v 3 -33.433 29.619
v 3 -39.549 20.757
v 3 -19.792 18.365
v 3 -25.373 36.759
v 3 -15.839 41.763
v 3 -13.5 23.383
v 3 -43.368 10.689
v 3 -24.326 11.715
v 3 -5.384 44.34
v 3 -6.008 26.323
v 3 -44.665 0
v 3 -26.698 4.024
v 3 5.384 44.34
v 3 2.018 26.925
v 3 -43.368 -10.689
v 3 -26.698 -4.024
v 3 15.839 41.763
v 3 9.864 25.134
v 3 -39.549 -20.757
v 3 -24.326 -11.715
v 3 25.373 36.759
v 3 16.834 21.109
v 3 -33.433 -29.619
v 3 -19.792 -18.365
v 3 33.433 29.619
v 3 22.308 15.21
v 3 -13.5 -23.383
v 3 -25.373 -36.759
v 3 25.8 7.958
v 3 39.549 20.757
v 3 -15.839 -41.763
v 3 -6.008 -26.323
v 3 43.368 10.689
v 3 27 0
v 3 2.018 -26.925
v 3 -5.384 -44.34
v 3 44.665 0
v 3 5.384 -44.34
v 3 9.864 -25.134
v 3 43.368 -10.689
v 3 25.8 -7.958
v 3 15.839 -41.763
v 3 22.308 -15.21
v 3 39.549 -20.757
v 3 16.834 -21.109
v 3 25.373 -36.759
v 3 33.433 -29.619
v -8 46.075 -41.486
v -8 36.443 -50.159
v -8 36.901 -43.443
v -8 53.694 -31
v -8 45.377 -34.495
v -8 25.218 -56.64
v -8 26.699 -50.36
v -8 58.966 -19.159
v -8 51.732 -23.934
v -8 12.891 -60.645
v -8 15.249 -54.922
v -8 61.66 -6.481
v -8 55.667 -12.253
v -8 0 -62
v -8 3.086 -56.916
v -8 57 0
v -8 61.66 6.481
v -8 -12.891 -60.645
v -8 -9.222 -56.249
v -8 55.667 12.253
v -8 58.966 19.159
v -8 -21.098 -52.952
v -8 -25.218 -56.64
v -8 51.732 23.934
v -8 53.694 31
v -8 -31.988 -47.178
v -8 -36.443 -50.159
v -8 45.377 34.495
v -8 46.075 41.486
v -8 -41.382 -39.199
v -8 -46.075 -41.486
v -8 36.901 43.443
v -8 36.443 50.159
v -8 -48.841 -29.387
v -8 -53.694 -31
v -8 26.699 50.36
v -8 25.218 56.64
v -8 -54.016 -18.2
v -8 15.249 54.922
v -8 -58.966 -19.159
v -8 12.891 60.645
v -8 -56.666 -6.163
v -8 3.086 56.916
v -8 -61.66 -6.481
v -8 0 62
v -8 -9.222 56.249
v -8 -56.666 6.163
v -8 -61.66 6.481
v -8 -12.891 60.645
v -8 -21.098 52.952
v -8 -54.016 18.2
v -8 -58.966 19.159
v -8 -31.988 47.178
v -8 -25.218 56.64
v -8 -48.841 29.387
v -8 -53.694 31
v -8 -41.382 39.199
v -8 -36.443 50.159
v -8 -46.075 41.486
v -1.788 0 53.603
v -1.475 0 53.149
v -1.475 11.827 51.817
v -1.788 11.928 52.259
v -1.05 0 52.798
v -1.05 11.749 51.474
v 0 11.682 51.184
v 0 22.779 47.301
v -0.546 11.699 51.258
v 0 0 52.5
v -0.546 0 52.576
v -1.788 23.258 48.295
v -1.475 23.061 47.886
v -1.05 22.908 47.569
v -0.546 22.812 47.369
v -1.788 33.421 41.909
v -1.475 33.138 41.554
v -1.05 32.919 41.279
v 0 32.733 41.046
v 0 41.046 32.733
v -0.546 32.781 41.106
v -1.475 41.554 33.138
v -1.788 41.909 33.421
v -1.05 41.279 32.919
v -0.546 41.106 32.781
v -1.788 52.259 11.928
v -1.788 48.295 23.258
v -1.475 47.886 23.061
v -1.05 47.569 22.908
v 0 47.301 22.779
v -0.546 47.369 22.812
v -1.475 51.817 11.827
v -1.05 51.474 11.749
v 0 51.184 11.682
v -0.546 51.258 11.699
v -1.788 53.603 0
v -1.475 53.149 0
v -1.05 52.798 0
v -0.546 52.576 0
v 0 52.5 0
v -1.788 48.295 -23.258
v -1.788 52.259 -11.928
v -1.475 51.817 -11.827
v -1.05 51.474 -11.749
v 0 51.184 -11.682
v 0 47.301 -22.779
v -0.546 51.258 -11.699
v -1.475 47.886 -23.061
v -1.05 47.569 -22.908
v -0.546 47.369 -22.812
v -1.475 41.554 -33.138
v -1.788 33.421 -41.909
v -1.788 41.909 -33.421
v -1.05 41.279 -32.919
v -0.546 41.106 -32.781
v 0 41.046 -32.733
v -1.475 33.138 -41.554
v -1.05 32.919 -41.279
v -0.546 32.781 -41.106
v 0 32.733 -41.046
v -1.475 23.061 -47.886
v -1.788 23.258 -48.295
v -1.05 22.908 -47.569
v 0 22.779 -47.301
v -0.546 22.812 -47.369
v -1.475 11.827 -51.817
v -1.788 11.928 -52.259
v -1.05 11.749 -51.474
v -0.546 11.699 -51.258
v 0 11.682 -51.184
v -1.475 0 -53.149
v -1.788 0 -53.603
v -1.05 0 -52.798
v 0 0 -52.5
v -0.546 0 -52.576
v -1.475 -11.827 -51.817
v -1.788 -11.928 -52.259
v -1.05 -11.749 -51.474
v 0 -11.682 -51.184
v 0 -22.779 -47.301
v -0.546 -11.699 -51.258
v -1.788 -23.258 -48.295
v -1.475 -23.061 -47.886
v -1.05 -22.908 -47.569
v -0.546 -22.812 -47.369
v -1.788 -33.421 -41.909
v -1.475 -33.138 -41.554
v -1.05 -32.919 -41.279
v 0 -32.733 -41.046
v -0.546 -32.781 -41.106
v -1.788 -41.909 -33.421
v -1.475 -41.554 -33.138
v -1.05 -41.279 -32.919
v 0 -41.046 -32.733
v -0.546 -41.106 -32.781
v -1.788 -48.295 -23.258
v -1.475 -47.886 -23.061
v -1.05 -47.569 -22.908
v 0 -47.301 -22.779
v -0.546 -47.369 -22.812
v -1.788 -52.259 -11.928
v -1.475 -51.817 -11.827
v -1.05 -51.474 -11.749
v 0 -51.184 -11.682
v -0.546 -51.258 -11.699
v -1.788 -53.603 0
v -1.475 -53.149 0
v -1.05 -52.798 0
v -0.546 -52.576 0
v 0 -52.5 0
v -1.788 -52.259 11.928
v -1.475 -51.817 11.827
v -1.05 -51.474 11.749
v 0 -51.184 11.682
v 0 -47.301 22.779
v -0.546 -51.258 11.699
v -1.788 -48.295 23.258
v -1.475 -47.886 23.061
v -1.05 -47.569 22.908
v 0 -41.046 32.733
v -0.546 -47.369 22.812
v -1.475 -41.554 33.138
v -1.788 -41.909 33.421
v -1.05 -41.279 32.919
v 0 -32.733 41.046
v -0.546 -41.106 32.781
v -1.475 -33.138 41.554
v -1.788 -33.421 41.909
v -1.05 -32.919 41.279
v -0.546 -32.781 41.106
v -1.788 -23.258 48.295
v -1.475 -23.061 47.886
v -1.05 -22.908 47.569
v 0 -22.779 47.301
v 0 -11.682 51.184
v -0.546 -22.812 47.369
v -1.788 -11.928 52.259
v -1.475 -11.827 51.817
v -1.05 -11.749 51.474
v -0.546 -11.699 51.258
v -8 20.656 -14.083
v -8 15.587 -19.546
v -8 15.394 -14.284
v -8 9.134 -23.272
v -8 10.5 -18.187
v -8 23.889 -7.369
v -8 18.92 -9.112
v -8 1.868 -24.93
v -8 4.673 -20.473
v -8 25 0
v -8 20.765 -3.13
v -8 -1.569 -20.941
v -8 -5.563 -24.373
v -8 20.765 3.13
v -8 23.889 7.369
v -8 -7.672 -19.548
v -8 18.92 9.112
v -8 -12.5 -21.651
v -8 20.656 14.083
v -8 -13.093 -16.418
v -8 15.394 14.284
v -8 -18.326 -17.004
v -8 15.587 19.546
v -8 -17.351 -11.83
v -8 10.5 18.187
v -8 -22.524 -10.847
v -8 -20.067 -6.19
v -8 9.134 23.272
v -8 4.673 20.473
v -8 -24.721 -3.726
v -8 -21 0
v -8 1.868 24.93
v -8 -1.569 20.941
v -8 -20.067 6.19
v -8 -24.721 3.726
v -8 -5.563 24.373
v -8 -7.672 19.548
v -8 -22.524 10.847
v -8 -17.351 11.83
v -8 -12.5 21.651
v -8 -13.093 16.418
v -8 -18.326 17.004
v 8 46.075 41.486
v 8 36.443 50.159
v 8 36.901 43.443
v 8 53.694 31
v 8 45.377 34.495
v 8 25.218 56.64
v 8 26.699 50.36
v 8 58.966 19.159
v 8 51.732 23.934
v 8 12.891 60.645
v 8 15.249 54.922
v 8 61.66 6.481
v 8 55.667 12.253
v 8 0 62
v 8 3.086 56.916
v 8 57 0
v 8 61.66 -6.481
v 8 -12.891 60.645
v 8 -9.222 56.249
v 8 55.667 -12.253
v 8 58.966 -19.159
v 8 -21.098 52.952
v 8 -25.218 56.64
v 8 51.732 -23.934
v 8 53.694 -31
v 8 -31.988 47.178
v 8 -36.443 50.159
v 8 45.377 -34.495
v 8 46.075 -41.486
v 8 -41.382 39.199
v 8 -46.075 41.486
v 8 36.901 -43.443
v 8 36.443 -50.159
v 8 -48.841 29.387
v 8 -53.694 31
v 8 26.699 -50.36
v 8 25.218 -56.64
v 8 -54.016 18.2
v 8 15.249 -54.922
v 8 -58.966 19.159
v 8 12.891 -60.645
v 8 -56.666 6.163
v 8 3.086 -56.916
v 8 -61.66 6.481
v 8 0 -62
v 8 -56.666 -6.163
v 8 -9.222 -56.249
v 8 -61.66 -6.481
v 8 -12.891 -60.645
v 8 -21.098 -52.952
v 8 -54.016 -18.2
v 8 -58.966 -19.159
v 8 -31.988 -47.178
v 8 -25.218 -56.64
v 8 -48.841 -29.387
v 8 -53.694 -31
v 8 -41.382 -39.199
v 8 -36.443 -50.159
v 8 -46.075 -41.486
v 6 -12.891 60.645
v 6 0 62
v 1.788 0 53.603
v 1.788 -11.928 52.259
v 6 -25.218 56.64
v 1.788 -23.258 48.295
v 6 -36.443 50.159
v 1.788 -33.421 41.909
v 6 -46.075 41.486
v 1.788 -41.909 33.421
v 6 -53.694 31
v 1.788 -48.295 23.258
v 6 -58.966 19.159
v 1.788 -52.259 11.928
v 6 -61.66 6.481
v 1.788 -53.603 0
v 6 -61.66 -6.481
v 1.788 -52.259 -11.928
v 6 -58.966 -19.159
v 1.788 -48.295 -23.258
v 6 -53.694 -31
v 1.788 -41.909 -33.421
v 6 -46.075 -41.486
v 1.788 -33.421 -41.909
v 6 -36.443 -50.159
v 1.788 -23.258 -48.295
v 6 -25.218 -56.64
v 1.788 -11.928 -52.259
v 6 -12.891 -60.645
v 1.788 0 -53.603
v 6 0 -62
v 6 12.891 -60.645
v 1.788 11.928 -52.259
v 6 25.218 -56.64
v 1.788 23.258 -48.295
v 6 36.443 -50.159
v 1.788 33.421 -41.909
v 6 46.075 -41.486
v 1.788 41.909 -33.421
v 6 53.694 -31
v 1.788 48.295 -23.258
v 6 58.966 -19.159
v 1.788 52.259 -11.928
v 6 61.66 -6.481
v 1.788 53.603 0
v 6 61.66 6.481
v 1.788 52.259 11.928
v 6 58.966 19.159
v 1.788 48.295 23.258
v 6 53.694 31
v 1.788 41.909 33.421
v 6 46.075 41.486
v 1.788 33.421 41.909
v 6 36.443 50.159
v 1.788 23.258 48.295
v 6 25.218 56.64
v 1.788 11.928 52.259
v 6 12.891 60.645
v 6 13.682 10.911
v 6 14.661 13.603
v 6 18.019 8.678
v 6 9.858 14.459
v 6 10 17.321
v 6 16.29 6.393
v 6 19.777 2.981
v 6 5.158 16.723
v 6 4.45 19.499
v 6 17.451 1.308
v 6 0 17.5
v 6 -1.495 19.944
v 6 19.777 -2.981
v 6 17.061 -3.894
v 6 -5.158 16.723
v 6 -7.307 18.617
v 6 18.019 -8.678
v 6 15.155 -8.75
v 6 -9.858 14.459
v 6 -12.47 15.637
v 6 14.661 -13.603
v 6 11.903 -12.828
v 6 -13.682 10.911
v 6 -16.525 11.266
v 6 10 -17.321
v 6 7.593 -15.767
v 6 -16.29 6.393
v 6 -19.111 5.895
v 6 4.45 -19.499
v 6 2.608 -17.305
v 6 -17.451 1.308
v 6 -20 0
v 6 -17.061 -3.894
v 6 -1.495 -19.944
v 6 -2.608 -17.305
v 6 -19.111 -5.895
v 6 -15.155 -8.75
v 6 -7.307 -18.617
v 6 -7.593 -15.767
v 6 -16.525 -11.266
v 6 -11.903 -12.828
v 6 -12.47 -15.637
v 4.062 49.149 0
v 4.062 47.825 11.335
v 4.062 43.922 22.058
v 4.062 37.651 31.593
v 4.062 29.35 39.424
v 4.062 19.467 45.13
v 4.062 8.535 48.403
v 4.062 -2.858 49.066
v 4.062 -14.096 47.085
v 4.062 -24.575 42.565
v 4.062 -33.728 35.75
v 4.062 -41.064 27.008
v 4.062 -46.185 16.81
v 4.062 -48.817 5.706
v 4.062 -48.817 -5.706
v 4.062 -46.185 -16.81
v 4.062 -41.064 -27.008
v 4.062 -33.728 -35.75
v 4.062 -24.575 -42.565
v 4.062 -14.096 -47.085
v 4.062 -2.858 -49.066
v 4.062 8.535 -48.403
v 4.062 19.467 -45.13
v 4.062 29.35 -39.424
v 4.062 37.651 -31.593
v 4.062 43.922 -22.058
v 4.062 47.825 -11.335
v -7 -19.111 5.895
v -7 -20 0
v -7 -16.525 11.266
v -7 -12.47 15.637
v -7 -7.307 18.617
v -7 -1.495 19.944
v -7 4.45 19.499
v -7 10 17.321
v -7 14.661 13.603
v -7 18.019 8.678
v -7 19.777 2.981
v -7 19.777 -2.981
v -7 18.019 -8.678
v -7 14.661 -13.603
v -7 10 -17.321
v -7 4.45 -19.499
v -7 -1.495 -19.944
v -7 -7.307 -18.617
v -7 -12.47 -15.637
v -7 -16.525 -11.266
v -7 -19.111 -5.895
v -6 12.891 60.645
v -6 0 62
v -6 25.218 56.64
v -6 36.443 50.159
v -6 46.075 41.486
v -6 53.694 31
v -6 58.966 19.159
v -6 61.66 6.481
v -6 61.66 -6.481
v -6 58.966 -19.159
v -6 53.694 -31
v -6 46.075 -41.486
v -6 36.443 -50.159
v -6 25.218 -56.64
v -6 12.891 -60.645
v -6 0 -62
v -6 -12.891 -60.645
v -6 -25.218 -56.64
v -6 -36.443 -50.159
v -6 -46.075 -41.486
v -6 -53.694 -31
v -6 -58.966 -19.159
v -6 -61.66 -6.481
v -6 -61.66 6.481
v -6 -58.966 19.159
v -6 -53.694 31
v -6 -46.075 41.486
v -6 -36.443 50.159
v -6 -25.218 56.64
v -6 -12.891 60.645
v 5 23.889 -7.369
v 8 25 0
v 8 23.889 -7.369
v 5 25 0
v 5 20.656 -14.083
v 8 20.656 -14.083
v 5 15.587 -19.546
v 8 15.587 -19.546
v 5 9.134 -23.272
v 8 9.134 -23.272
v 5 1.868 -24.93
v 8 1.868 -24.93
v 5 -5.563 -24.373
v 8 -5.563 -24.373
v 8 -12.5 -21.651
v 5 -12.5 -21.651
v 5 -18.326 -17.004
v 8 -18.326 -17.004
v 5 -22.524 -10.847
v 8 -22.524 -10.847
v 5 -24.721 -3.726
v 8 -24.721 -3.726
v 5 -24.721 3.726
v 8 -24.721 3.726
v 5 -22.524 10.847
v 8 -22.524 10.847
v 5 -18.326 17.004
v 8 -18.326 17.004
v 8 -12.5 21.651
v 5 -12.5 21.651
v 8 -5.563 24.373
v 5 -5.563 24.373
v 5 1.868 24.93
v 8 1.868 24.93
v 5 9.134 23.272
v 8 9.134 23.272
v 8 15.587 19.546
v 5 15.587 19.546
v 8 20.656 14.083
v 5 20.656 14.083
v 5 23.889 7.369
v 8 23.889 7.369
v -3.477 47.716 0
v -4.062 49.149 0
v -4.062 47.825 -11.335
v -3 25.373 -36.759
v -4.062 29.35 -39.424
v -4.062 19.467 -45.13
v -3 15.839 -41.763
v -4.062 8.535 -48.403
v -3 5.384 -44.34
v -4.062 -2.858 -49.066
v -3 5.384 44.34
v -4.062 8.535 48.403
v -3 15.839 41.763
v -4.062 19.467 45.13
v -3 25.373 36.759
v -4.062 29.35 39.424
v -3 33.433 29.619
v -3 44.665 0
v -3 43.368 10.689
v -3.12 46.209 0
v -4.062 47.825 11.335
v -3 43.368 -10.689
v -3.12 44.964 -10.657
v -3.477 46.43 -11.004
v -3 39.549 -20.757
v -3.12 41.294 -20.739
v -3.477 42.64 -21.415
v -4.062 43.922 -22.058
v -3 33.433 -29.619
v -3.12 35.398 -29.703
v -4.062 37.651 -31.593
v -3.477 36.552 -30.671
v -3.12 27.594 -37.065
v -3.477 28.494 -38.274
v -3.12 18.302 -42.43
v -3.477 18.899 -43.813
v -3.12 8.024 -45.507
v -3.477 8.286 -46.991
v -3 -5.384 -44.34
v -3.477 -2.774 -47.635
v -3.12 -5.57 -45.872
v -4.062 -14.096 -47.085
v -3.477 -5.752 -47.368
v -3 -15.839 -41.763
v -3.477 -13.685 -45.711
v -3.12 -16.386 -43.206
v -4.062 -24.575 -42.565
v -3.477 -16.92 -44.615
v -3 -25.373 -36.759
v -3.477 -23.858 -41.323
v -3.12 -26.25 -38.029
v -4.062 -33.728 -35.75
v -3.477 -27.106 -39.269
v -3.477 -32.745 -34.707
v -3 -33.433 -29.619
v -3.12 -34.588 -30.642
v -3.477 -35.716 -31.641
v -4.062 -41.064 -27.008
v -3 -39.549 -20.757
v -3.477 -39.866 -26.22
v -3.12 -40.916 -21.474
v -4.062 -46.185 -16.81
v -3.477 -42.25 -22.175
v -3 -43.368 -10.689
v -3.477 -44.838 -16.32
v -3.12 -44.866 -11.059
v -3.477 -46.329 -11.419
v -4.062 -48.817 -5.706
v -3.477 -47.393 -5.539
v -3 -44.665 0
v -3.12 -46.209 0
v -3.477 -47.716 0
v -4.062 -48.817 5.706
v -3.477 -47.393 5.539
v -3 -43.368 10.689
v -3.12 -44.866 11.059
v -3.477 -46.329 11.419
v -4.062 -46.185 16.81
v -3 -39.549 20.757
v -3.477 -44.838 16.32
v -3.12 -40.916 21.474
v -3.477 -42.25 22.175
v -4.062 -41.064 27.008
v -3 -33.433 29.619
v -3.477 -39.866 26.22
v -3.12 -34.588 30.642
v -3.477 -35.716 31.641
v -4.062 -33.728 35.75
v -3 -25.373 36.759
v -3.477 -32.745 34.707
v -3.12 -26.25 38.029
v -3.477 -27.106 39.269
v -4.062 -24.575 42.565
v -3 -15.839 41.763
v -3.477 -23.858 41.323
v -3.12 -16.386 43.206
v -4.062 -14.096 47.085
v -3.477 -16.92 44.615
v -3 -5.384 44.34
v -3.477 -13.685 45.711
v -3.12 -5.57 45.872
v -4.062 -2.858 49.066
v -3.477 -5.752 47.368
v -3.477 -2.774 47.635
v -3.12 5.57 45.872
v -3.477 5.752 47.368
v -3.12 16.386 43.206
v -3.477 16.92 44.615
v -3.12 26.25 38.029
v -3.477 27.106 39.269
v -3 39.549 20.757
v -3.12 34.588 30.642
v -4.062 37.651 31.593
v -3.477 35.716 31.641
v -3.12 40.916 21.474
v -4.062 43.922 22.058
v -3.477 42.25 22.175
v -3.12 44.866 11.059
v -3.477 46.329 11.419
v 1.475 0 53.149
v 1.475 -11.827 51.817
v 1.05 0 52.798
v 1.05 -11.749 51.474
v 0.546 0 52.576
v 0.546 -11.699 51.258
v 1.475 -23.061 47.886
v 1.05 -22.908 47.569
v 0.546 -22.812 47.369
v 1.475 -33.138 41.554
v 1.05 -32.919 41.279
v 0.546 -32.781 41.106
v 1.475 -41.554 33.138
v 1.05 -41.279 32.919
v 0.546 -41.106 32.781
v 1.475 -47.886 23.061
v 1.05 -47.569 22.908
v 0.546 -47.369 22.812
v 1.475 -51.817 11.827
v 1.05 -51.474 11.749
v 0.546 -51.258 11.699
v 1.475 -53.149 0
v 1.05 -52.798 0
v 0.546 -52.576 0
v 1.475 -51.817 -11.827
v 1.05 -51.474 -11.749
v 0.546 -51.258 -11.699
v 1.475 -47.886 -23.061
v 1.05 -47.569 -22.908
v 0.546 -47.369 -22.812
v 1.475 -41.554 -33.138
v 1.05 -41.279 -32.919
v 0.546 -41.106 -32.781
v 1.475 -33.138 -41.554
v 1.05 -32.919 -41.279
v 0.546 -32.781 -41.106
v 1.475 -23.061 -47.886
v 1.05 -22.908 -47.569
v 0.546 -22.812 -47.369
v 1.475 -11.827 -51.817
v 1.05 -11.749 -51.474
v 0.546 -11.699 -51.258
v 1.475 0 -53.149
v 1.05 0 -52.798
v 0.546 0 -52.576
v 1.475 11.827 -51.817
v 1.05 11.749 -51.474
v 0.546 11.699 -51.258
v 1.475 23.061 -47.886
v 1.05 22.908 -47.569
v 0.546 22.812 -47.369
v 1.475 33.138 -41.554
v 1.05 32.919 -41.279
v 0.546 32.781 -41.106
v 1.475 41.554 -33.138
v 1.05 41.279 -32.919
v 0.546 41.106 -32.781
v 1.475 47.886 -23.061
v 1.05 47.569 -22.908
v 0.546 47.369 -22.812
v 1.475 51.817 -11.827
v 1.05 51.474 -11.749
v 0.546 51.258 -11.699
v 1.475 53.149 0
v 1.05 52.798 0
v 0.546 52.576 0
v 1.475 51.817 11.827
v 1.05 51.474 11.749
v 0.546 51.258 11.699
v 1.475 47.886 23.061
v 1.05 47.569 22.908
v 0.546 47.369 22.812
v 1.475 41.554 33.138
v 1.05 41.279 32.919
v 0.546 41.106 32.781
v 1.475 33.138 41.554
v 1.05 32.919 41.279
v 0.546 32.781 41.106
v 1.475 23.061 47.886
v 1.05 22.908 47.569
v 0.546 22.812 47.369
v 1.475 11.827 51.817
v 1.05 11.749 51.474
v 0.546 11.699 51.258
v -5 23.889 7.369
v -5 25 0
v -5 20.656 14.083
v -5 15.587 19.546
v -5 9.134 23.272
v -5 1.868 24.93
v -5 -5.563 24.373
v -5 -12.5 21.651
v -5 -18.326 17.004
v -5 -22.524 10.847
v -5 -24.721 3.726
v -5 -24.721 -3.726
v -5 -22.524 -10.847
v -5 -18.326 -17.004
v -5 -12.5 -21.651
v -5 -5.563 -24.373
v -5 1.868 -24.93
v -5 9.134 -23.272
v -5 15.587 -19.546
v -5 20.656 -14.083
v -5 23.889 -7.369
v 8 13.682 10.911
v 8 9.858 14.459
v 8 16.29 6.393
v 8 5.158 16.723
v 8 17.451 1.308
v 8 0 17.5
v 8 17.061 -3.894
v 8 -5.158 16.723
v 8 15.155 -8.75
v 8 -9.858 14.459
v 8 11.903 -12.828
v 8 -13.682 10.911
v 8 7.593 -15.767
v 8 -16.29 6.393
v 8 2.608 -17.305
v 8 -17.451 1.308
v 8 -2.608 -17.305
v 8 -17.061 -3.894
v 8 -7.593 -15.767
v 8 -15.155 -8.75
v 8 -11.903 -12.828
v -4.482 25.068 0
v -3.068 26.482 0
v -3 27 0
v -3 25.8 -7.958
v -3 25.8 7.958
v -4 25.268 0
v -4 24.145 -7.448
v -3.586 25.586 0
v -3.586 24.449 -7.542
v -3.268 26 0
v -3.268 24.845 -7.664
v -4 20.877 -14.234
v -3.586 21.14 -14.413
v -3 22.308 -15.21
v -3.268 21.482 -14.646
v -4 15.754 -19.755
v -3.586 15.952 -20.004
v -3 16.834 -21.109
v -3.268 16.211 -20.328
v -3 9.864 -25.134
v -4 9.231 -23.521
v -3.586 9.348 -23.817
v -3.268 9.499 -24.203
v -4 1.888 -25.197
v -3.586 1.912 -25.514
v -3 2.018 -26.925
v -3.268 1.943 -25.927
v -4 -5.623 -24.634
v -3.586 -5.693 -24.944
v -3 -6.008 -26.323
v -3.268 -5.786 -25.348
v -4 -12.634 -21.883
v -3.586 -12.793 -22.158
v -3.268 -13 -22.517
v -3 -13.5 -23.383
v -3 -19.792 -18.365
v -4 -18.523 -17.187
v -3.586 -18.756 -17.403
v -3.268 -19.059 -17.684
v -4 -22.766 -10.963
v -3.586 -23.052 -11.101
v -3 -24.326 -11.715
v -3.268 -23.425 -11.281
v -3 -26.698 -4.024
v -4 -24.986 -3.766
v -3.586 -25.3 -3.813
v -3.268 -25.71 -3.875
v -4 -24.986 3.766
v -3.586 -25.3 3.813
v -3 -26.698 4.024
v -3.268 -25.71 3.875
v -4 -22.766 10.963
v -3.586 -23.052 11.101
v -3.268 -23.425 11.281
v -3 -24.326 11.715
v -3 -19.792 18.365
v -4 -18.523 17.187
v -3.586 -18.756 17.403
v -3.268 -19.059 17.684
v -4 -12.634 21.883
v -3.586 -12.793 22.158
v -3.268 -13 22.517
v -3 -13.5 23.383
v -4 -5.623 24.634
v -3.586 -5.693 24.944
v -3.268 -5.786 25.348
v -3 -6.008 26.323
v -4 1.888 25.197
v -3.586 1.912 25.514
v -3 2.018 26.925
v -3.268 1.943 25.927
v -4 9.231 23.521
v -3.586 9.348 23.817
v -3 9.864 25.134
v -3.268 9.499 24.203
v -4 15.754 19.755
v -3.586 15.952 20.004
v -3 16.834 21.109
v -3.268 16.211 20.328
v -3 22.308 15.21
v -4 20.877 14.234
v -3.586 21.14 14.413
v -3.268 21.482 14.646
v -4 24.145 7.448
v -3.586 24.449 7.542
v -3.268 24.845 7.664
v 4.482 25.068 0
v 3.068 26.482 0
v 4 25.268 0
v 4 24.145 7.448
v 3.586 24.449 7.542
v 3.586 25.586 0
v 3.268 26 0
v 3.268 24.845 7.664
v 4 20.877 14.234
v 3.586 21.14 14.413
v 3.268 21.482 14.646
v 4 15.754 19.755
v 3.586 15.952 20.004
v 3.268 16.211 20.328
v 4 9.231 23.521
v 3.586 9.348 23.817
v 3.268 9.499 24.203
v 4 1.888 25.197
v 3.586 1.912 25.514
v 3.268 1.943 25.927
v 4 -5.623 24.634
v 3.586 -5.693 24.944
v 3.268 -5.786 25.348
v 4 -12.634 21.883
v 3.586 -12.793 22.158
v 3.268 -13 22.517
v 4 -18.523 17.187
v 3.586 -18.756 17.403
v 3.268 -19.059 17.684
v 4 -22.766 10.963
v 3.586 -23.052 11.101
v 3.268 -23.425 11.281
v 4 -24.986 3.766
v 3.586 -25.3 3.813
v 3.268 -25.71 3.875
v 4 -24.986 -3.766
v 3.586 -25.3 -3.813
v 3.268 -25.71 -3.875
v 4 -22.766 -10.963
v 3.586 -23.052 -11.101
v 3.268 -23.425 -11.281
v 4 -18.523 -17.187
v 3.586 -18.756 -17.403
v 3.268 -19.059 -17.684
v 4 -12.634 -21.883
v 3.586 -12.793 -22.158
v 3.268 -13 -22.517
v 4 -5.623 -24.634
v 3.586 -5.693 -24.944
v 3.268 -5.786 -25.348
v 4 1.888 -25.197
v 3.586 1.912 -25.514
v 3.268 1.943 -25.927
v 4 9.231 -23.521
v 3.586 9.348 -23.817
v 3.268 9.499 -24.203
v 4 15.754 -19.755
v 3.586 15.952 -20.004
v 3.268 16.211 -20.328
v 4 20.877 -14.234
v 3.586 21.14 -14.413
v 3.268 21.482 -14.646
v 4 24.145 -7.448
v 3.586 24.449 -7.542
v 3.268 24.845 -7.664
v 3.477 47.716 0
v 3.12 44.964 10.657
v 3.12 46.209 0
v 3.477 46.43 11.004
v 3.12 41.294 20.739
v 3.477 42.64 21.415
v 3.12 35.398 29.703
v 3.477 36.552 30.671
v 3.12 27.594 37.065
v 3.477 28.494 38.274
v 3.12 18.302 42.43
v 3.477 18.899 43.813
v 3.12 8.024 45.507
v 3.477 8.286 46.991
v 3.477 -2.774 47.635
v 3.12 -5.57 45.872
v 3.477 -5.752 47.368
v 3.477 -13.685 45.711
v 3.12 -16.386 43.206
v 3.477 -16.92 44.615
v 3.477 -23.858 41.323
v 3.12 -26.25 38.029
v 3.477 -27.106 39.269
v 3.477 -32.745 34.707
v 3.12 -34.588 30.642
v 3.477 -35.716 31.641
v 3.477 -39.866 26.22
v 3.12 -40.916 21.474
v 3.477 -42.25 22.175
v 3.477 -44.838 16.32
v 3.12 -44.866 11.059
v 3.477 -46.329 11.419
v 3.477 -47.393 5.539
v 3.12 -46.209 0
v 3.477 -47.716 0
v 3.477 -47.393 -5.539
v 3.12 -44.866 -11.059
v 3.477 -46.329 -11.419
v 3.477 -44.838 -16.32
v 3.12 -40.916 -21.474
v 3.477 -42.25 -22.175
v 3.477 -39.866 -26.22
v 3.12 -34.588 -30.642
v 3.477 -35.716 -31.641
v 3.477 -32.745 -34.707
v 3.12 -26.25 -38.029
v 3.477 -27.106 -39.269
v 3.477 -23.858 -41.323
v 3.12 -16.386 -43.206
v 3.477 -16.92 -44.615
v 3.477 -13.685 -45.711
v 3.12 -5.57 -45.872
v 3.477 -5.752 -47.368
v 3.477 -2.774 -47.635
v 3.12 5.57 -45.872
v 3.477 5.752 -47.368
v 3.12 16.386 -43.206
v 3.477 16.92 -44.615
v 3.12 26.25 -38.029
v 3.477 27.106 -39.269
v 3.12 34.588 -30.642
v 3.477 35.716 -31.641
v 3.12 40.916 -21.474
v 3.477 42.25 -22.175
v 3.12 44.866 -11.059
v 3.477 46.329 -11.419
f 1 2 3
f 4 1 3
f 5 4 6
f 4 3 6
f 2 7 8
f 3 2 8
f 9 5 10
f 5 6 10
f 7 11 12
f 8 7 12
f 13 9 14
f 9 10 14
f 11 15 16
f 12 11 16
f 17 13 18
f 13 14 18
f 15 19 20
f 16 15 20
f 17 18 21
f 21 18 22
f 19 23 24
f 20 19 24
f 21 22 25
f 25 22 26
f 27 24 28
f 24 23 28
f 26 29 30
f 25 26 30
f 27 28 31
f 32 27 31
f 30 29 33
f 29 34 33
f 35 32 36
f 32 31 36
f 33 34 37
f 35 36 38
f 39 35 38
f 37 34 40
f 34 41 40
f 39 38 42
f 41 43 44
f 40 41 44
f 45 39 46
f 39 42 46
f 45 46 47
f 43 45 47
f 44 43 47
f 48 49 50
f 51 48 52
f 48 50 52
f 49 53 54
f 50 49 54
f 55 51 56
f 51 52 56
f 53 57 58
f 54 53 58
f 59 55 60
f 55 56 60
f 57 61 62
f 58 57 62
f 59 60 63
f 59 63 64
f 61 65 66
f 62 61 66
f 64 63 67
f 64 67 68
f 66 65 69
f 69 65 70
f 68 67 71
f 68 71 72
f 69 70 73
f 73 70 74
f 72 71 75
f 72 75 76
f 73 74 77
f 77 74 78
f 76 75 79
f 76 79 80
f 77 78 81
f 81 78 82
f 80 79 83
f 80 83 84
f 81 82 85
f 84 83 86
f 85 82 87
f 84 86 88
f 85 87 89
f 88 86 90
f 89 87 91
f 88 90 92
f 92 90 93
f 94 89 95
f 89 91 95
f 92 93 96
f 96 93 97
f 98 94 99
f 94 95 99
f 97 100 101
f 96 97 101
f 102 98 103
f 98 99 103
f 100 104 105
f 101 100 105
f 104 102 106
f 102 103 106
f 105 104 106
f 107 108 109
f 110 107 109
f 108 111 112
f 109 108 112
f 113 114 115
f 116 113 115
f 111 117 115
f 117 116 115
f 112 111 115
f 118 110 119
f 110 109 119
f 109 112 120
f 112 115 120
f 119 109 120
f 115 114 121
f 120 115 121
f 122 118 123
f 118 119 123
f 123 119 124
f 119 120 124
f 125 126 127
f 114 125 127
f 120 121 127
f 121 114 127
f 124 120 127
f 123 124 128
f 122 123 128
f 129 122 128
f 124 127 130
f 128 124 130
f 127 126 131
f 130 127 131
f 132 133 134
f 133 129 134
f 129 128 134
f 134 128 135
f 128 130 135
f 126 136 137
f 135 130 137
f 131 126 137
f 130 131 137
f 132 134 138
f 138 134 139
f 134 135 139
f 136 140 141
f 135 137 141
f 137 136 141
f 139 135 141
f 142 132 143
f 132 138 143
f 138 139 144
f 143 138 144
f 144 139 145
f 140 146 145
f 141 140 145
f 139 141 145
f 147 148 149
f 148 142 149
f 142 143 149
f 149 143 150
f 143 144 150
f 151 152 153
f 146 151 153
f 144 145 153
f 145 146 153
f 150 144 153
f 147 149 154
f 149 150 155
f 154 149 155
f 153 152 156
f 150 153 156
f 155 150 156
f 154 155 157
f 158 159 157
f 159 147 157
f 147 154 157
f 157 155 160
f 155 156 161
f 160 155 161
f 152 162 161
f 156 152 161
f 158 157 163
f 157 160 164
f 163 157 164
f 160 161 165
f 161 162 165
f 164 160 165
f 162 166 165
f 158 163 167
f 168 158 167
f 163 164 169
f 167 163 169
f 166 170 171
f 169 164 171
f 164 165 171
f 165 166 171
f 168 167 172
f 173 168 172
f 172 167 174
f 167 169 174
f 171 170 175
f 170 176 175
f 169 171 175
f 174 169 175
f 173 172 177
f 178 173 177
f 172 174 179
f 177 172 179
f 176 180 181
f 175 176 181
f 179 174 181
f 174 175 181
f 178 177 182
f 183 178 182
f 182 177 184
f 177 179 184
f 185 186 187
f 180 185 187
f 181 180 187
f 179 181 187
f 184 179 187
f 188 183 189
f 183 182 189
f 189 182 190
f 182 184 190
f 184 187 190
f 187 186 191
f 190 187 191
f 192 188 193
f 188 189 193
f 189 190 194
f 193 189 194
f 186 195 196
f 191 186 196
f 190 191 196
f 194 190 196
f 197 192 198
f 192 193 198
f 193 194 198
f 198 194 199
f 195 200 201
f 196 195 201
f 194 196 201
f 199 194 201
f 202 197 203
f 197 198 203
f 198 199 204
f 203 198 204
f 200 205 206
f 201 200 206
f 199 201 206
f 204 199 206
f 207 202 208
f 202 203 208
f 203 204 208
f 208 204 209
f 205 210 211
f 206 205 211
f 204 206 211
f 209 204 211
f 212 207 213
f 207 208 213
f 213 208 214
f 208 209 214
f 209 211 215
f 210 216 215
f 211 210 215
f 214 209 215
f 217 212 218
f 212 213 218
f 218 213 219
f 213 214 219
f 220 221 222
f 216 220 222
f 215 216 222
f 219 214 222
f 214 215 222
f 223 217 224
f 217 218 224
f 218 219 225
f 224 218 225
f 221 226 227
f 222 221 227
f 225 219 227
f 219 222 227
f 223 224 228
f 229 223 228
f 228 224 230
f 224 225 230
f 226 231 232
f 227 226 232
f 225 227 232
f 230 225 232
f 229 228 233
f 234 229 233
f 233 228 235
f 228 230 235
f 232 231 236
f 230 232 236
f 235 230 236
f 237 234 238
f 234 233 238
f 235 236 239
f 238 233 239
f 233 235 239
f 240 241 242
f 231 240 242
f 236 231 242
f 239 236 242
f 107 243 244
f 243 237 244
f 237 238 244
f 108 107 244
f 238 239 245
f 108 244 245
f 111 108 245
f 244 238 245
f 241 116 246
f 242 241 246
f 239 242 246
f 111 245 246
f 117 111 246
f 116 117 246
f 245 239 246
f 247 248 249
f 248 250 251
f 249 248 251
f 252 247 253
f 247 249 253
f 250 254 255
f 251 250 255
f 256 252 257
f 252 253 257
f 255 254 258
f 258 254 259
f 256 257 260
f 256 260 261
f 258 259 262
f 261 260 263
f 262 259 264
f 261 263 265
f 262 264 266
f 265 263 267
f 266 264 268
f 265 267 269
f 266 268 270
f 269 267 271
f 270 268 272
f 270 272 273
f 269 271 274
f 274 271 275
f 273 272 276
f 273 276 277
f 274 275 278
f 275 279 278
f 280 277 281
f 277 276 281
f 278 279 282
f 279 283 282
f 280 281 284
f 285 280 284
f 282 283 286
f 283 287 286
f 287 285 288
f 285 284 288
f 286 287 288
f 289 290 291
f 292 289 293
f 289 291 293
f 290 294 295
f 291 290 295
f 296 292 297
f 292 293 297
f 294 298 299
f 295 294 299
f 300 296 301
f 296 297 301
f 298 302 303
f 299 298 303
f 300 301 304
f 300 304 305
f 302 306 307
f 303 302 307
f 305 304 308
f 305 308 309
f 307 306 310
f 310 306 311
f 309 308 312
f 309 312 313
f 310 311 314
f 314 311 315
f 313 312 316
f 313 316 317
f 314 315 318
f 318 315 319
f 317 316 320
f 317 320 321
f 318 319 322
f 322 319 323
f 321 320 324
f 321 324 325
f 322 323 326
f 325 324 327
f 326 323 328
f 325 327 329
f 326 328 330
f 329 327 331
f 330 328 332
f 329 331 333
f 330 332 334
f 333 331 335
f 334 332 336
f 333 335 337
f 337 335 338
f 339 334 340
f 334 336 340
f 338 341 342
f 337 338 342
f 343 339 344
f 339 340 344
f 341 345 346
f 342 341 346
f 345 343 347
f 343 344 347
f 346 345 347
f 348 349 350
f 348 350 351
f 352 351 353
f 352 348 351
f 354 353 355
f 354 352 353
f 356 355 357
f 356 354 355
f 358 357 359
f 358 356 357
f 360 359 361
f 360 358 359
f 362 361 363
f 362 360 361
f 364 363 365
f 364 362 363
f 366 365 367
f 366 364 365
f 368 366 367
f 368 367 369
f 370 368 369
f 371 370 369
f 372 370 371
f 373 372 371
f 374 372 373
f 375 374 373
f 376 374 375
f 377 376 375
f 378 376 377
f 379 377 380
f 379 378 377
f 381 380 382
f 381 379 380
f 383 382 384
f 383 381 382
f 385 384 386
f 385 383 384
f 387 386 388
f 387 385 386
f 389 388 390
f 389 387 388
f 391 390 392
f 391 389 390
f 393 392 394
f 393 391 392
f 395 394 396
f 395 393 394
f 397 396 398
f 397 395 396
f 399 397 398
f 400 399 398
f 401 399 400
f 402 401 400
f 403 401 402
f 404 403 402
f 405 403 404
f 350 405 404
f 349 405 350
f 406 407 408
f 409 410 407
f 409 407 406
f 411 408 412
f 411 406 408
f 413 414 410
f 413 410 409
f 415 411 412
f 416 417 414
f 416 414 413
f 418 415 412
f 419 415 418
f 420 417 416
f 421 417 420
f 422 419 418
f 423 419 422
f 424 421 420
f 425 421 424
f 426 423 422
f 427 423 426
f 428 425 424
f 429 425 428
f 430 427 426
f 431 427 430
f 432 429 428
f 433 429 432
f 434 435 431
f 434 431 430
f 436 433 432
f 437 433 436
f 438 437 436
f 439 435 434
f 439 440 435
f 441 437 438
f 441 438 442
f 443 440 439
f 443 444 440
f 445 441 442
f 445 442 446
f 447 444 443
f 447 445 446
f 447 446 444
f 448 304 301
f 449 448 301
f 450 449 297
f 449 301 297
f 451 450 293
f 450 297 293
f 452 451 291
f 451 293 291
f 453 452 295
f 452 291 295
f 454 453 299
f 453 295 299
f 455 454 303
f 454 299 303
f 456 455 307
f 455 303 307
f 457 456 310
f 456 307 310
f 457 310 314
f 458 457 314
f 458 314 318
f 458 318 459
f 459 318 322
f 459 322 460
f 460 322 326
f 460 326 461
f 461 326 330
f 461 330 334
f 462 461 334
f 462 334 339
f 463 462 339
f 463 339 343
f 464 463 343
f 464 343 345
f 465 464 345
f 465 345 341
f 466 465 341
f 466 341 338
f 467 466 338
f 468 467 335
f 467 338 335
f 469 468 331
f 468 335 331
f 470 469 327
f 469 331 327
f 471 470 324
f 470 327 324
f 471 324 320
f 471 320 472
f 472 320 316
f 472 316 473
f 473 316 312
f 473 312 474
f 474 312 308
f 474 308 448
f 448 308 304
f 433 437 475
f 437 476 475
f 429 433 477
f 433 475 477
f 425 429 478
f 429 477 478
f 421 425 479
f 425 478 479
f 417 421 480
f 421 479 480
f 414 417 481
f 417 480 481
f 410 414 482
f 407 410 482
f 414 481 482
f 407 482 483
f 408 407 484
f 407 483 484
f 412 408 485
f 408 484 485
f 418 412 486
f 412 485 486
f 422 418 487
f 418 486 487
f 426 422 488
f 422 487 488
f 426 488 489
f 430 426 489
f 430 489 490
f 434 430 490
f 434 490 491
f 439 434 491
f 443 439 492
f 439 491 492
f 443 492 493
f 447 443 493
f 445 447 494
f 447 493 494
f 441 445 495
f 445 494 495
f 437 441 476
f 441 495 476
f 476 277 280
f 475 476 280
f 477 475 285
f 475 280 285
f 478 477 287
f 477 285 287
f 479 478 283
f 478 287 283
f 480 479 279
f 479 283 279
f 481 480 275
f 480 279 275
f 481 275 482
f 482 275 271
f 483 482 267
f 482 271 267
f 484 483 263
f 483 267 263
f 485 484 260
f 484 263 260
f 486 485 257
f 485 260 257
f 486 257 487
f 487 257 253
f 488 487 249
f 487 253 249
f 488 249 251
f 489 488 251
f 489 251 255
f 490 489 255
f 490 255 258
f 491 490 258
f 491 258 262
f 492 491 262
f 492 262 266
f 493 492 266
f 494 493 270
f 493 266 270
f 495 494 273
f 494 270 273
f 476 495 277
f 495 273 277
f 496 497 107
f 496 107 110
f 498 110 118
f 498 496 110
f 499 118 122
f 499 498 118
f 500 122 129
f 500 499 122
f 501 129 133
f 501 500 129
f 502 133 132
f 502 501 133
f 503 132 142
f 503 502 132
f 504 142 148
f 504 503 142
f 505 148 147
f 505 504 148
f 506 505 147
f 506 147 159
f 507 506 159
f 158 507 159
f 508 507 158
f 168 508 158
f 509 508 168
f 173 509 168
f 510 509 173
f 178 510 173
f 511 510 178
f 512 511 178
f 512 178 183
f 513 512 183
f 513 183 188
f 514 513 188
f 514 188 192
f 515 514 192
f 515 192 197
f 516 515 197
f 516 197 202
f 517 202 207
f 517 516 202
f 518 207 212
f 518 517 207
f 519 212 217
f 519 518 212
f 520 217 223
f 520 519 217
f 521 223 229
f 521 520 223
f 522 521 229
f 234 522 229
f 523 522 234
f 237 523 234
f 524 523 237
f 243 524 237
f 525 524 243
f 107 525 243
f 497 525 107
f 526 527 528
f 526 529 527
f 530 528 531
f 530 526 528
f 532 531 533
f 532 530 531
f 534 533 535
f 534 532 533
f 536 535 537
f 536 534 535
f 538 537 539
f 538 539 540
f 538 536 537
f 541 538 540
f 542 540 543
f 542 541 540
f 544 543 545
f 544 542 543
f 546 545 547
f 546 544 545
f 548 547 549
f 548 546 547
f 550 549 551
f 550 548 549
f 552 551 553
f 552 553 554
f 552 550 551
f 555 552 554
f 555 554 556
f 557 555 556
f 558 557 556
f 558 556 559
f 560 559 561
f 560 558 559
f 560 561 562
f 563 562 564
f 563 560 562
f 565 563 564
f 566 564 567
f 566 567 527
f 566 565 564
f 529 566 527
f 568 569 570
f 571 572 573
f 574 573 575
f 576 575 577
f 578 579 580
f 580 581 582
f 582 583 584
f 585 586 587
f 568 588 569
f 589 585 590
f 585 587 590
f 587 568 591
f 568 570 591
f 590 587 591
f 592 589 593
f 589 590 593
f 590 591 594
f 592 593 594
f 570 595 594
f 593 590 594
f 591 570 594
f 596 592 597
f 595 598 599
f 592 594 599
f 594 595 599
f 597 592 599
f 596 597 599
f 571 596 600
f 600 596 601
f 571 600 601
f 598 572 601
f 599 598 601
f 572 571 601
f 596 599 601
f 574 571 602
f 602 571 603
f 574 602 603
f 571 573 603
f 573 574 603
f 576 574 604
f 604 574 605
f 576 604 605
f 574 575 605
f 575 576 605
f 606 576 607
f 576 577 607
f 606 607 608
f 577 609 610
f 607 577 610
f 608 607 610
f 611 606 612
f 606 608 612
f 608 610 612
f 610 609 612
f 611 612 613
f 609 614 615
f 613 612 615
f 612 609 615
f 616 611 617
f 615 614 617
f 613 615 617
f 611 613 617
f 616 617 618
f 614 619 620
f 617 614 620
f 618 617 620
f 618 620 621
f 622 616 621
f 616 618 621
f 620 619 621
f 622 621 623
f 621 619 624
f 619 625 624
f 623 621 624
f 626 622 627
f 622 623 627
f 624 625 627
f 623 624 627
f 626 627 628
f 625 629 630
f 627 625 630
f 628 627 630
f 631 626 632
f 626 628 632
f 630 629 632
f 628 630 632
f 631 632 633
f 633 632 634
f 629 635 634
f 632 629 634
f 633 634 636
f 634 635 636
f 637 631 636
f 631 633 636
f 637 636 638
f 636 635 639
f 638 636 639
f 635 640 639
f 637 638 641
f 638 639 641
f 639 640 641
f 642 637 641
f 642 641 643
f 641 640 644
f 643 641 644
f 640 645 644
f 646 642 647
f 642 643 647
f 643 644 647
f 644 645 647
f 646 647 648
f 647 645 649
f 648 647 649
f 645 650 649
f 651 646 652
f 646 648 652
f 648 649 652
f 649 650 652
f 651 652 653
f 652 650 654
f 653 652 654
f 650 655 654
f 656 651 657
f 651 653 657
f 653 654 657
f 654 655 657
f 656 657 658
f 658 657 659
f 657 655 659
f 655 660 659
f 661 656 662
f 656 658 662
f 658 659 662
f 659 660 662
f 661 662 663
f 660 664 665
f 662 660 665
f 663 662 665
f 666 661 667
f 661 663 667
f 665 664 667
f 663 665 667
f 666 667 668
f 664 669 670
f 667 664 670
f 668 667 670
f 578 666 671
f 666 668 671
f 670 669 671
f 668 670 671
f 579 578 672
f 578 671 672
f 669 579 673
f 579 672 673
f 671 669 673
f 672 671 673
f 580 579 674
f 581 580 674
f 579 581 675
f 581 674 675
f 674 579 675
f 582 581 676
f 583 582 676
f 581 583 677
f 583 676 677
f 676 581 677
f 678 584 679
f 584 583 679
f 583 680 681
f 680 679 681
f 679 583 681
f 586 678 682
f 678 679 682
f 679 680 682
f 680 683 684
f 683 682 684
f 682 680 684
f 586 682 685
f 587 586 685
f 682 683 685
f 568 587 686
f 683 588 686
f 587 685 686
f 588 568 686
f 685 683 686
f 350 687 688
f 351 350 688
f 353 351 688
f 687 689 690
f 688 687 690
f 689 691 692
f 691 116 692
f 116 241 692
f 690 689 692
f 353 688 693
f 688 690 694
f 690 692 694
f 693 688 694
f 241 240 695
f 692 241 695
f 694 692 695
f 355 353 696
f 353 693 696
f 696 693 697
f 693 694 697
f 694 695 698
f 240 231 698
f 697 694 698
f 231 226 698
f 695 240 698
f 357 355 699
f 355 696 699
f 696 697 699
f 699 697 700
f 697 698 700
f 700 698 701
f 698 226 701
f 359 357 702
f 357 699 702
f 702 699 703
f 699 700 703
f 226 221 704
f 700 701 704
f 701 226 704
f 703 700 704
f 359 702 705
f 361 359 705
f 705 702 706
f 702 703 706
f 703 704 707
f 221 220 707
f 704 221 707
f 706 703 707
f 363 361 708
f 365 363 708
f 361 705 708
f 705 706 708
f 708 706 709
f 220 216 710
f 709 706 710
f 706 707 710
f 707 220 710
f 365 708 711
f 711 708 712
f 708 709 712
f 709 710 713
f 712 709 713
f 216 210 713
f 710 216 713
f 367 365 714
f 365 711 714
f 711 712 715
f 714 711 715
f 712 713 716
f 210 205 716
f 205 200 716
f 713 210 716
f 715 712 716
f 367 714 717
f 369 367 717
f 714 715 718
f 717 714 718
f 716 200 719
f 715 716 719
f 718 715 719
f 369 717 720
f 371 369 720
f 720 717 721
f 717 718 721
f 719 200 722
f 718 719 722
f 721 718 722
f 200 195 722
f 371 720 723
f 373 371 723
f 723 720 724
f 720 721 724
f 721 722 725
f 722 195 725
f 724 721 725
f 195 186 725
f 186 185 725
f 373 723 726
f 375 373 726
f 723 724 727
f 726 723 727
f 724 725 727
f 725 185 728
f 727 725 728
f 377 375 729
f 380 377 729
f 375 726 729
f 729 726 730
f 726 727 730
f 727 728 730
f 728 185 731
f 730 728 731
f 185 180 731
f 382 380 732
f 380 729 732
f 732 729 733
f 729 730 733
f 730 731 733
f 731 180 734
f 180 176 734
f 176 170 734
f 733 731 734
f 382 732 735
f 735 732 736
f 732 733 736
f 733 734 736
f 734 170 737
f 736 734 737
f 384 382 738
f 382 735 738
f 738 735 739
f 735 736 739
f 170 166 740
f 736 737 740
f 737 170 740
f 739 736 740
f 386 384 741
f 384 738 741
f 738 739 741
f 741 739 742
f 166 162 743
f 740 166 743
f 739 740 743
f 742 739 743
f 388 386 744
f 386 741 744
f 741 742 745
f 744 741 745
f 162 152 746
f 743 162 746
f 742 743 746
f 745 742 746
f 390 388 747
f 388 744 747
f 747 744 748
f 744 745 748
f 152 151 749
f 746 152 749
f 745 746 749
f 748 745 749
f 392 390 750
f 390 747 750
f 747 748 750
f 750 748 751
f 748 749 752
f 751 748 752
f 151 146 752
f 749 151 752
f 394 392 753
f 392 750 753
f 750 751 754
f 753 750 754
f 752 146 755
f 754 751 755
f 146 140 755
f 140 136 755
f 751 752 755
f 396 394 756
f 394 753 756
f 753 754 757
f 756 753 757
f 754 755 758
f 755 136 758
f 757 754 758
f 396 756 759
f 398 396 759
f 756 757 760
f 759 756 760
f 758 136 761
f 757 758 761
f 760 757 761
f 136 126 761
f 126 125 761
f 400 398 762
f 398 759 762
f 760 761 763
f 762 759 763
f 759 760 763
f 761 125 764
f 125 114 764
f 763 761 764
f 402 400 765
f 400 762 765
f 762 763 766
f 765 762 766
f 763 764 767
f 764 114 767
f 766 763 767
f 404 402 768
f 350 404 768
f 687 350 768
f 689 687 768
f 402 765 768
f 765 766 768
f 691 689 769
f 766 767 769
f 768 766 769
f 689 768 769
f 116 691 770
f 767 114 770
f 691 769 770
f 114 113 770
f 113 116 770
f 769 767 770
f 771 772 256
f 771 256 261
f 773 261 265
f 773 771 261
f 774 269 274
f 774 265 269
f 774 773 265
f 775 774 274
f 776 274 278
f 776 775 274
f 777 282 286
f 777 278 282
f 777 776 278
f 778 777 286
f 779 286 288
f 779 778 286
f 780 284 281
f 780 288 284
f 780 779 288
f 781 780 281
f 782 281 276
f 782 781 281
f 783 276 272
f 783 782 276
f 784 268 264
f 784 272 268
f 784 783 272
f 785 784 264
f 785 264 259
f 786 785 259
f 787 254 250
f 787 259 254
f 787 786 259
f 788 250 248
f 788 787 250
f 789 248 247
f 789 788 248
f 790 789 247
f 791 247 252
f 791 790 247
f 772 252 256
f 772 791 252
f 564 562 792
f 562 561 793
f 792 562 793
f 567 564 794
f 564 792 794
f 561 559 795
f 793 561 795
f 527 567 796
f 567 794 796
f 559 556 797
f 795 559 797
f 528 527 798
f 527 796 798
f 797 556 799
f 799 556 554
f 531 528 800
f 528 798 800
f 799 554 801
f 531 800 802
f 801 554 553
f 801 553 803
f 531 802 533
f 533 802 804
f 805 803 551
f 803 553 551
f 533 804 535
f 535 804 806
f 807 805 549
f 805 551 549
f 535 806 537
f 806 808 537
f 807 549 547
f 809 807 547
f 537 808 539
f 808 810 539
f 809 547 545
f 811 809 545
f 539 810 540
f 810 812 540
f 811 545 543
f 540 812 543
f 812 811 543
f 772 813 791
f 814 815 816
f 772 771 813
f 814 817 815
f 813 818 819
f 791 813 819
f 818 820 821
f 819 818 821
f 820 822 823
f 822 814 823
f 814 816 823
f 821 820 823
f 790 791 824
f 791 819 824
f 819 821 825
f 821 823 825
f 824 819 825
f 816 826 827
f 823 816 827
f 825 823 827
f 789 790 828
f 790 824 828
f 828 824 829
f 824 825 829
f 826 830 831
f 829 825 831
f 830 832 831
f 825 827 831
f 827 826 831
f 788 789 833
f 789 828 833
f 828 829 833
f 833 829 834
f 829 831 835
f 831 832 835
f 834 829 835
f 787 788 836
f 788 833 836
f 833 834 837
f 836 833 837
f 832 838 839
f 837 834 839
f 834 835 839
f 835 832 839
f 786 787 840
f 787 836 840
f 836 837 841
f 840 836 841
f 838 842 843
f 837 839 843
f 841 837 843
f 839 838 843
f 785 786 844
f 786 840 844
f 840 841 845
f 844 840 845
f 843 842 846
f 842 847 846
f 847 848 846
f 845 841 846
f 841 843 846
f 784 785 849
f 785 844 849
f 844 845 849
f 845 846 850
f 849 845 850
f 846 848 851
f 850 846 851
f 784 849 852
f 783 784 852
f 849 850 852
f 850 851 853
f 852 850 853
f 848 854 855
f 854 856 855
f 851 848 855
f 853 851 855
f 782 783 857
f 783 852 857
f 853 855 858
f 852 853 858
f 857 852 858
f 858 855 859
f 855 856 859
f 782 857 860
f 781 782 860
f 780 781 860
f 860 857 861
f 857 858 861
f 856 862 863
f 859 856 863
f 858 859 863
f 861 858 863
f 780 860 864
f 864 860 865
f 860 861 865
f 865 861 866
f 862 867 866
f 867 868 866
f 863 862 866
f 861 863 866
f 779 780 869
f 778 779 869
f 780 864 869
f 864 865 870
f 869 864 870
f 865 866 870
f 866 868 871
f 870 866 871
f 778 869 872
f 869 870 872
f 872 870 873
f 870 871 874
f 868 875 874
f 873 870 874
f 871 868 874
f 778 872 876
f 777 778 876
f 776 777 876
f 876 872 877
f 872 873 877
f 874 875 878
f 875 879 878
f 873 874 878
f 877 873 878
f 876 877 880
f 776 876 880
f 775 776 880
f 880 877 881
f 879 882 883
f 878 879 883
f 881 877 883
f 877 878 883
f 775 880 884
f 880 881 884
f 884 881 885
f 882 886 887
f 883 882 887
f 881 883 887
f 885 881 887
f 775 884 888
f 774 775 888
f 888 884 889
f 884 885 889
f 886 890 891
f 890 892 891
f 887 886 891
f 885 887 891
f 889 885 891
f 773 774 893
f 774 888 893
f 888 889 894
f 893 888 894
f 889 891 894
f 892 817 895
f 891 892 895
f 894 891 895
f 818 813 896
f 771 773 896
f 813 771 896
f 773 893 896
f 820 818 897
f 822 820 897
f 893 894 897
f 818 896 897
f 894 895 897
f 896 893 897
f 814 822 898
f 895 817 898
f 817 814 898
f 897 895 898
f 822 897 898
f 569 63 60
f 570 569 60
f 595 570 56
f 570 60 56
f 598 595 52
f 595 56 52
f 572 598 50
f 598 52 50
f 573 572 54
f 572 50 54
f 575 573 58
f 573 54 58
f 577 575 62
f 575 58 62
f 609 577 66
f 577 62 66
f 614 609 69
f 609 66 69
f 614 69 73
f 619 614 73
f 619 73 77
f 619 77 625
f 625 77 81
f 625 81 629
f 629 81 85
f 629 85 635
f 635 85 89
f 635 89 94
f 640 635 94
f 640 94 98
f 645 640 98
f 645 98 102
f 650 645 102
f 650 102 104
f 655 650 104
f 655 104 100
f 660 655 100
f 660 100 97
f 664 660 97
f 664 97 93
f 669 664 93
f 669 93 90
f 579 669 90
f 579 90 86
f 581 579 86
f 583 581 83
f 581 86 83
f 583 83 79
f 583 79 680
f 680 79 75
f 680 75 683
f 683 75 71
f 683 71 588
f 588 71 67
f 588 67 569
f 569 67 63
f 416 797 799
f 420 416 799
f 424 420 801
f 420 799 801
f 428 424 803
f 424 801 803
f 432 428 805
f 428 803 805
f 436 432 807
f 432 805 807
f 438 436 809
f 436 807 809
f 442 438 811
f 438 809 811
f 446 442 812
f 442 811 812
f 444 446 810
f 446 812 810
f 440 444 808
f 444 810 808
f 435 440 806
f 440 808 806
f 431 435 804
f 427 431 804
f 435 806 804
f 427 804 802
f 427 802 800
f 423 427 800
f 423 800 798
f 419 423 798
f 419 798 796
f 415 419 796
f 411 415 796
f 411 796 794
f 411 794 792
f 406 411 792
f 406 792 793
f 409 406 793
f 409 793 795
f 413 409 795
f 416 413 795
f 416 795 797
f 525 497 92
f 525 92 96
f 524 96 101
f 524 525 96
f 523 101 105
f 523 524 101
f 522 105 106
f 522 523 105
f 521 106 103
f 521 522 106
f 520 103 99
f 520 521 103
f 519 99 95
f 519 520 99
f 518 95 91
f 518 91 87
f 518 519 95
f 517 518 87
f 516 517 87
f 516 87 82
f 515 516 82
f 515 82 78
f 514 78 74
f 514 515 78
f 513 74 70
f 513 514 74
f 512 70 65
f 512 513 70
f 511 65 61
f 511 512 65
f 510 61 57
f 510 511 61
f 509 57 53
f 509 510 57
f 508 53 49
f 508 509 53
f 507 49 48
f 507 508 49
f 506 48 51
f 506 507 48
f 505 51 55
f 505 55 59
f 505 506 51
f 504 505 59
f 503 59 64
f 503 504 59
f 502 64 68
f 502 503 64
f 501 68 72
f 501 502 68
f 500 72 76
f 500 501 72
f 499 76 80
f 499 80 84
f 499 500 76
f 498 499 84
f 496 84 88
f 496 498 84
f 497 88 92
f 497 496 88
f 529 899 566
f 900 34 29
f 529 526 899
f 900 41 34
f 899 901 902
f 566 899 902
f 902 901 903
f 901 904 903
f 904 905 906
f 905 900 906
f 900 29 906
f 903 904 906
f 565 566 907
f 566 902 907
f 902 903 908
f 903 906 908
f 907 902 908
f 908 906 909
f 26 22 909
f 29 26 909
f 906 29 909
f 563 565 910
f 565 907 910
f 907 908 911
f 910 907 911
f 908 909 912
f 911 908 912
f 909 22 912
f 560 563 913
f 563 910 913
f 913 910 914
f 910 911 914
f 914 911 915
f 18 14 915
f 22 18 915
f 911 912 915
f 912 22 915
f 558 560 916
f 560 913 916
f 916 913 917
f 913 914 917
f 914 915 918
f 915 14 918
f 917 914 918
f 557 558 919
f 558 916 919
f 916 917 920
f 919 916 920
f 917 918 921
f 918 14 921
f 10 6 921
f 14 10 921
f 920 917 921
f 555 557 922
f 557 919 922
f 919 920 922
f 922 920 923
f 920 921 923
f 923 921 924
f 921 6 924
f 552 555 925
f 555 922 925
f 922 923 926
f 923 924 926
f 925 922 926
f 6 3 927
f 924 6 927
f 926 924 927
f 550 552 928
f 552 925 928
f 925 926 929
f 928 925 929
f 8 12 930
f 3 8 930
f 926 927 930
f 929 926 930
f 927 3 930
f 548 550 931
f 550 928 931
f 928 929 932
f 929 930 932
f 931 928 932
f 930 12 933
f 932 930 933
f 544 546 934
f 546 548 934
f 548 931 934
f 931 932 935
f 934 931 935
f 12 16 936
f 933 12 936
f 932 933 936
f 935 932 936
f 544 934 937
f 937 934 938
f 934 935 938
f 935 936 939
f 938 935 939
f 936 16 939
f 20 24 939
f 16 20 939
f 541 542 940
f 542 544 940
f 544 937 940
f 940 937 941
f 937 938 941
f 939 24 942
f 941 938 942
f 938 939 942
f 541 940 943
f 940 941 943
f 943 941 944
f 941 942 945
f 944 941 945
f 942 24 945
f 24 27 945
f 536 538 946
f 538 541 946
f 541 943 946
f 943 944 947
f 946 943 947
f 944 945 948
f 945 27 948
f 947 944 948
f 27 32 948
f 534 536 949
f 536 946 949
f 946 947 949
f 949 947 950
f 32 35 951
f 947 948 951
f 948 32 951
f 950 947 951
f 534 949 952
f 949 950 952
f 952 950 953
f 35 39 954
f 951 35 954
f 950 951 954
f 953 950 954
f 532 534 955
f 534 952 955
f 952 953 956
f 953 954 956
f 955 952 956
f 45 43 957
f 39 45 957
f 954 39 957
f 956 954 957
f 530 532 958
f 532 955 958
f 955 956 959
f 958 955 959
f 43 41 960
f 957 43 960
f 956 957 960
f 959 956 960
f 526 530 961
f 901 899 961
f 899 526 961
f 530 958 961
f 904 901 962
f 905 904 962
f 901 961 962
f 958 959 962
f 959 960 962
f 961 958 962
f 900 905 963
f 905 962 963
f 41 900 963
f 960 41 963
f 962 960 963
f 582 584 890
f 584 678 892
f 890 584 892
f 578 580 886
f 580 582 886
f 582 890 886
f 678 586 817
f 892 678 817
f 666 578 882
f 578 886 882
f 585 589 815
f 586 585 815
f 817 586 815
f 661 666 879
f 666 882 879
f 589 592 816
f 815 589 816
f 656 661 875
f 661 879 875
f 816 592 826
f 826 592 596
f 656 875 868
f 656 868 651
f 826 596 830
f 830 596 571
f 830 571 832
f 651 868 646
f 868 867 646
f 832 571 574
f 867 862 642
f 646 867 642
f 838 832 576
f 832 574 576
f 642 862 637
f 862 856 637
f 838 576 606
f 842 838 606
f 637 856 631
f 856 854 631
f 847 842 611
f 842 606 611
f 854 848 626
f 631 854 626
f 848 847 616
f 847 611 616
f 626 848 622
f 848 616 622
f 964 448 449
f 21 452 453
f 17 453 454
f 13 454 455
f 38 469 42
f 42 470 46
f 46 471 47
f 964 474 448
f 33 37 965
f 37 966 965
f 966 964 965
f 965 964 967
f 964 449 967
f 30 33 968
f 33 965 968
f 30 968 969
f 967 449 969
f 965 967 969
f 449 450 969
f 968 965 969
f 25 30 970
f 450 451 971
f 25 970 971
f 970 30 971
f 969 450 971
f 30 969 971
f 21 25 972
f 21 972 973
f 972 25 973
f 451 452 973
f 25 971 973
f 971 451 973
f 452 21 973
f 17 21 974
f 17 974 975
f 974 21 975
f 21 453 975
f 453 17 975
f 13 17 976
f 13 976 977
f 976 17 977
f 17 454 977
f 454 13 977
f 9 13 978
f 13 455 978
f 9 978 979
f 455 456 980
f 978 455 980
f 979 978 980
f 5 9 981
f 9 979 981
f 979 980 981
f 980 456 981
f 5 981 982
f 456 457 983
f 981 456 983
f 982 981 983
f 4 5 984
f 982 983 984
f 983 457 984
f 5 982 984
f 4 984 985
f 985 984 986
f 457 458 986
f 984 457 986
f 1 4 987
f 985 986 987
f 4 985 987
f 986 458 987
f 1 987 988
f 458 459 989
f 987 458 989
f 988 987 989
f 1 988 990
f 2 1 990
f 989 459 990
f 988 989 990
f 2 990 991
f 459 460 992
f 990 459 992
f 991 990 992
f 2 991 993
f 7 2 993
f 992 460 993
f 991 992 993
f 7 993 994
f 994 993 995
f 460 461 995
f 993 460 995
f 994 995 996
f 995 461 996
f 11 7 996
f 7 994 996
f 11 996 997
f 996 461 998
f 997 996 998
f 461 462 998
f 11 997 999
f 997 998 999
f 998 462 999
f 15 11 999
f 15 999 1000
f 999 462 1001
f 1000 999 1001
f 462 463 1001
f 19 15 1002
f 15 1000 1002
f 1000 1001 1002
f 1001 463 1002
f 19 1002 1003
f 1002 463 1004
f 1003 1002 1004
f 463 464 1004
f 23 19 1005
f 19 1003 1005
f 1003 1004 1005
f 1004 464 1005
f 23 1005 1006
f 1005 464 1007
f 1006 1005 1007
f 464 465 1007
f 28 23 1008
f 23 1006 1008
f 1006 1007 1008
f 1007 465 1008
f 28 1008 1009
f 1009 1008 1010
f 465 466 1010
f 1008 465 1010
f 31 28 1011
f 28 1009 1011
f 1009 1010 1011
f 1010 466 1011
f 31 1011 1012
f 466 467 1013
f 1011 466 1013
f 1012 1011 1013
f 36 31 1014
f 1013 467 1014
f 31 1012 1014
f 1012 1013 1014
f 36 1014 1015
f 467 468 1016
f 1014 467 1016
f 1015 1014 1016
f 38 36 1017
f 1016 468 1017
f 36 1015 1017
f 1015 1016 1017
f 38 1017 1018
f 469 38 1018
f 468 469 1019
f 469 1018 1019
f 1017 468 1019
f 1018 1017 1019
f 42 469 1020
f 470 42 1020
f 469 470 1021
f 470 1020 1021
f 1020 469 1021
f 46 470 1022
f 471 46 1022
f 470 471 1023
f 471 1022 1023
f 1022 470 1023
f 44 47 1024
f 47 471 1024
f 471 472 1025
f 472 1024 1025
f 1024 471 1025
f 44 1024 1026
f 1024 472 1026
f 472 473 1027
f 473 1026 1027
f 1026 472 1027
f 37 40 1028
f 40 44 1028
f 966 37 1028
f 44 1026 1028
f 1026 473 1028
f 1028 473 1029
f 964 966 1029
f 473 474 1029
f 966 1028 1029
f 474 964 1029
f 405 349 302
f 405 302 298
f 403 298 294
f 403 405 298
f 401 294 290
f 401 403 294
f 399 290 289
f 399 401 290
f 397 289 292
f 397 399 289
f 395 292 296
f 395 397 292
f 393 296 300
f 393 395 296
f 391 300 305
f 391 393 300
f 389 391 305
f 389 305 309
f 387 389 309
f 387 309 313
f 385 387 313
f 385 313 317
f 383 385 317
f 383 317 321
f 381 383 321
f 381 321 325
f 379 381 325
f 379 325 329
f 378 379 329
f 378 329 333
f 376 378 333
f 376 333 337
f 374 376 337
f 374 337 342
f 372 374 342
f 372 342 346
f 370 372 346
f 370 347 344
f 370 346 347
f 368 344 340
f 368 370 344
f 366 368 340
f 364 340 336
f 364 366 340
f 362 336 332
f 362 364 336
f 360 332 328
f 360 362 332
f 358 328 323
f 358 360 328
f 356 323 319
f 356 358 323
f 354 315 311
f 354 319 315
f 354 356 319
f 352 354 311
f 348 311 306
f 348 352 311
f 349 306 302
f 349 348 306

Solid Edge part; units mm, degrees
sketch "Sketch1" plane through (0, 0, 0) normal (0, -1, 0) x (1, 0, 0)
  line L0 (-8, 17.5) -> (-8, 62)
  line L1 (-8, 62) -> (-6, 62)
  line L2 (-6, 62) -> (-1.7877, 53.6032)
  arc A0 (-1.7877, 53.6032) -> (0, 52.5) centre (0, 54.5) ccw
  line L3 (0, 52.5) -> (0, 17.5)
  line L4 (0, 17.5) -> (-8, 17.5)
revolve "RevolvedProtrusion1" add sketch "Sketch1" angle 360 about axis through (-60, 0, 0) along (1, 0, 0)
mirror "Mirror1" about plane through (0, 0, 0) normal (1, 0, 0) of "RevolvedProtrusion1"
sketch "Sketch2" plane through (-8, 0, 0) normal (-1, 0, 0) x (0, -1, 0)
  circle A0 centre (0, 0) radius 20
extrude "Cutout1" cut sketch "Sketch2" against normal blind 14
chamfer "Fase_1" distance 1 angle 45 1 edges at (-8, 20, 0)
sketch "Sketch3" plane through (0, 0, 0) normal (0, 0, 1) x (1, 0, 0)
  line L0 (8, 57) -> (8, 25)
  line L1 (8, 25) -> (5, 25)
  arc A0 (5, 25) -> (3, 27) centre (5, 27) cw
  line L2 (3, 27) -> (3, 44.6654)
  arc A1 (3, 44.6654) -> (4.0617, 49.1494) centre (13, 44.6654) cw
  line L3 (4.0617, 49.1494) -> (8, 57)
revolve "RevolvedCutout1" cut sketch "Sketch3" angle 360 about axis through (57, 0, 0) along (-1, 0, 0)
mirror "Mirror2" about plane through (0, 0, 0) normal (1, 0, 0) of "RevolvedCutout1"
properties material "Aluminium, 1060"
